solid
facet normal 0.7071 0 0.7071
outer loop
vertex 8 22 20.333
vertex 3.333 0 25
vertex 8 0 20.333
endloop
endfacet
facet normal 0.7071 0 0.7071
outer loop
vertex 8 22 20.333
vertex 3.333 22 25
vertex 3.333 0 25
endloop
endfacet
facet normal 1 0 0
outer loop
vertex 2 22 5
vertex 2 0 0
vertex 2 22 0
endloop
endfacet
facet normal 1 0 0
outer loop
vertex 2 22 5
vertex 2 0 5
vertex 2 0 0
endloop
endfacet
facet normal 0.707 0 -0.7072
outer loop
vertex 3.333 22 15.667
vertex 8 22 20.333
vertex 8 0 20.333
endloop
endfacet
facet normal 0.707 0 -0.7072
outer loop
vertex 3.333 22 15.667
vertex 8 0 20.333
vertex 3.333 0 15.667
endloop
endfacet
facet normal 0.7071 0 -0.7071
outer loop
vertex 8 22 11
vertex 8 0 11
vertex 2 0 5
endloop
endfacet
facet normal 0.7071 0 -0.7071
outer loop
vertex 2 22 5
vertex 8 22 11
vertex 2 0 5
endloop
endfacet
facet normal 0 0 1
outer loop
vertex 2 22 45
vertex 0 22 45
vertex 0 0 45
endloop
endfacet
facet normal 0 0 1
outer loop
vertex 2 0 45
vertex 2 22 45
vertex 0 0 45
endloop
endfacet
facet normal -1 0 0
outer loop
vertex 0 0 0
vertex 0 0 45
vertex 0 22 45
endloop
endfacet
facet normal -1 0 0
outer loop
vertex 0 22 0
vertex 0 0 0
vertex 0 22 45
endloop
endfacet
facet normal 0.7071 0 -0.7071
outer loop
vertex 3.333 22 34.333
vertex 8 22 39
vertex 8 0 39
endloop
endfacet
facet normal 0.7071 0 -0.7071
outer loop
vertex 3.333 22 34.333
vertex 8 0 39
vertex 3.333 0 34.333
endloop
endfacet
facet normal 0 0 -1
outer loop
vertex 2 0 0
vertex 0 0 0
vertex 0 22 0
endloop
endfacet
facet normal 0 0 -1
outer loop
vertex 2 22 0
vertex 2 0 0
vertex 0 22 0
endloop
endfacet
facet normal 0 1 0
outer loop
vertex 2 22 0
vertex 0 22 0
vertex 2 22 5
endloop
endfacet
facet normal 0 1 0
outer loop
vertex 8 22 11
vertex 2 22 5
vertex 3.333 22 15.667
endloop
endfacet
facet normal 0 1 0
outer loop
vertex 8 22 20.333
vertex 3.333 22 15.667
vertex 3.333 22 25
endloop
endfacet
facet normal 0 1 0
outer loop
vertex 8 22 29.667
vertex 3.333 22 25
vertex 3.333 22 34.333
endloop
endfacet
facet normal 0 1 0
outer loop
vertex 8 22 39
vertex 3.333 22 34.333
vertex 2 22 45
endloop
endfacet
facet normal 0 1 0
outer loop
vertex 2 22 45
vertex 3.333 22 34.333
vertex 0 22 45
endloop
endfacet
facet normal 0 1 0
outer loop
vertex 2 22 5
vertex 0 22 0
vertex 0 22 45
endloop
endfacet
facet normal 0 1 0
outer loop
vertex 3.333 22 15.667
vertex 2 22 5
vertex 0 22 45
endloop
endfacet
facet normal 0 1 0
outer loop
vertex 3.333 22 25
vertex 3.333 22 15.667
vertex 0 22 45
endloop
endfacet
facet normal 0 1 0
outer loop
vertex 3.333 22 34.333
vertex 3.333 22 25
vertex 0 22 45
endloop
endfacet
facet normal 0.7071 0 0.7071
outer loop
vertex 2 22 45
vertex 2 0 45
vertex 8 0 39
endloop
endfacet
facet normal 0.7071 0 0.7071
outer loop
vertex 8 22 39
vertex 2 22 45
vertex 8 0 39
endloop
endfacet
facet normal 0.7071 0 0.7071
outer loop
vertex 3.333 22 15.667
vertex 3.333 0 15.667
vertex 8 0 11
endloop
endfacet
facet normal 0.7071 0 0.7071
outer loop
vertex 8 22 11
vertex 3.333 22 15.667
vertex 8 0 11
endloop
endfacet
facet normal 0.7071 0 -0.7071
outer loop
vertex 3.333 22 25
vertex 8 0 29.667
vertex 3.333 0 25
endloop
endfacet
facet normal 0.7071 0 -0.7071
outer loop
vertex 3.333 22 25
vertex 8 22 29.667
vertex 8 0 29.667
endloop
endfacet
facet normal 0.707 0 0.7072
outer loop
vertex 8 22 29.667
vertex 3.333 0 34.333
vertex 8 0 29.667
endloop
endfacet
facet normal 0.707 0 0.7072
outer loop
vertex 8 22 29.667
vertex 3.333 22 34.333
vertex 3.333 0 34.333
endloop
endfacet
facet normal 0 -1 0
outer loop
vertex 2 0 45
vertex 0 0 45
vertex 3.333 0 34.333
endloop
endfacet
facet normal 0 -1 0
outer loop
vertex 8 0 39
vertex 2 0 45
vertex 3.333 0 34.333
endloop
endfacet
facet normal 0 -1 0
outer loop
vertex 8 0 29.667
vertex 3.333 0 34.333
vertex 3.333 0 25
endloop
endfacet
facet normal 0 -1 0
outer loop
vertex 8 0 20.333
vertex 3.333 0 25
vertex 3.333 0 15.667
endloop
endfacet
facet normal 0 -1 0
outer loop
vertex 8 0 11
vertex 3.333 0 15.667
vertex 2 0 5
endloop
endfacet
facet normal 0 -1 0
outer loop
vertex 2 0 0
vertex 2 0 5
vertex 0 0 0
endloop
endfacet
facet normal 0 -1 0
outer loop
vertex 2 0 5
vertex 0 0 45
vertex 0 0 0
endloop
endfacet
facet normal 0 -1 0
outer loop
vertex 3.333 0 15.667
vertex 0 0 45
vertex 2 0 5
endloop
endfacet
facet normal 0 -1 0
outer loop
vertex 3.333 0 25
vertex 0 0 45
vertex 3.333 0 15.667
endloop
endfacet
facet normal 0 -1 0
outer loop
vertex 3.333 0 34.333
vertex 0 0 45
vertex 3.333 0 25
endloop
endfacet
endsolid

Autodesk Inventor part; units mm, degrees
ref_plane "YZ Plane" through (0, 0, 0) normal (1, 0, 0) x (0, 1, 0)
ref_plane "XZ Plane" through (0, 0, 0) normal (0, 1, 0) x (-1, 0, 0)
ref_plane "XY Plane" through (0, 0, 0) normal (0, 0, 1) x (1, 0, 0)
sketch "スケッチ1" plane through (0, 0, 0) normal (1, 0, 0) x (0, 1, 0)
  line L0 (0, 0) -> (22, 0)
  line L1 (22, 0) -> (22, 45)
  line L2 (22, 45) -> (0, 45)
  line L3 (0, 45) -> (0, 0)
  dimension "d0" = 22
  dimension "d1" = 45
extrude "押し出し1" add sketch "スケッチ1" along normal blind 2
sketch "スケッチ2" plane through (0, 22, 45) normal (0, 1, 0) x (1, 0, 0)
  line L0 (0, 0) -> (2, 0) projected
  line L1 (2, 0) -> (8, 6)
  line L2 (8, 6) -> (3.3333, 10.6667)
  line L3 (3.3333, 10.6667) -> (8, 15.3333)
  line L4 (8, 15.3333) -> (3.3333, 20)
  line L5 (3.3333, 20) -> (8, 24.6667)
  line L6 (8, 24.6667) -> (3.3333, 29.3333)
  line L7 (3.3333, 29.3333) -> (8, 34)
  line L8 (8, 34) -> (2, 40)
  line L9 (2, 45) -> (2, 0) projected
  point P0 (0, 45)
  dimension "d4" = 40
  dimension "d5" = 6
extrude "押し出し2" add sketch "スケッチ2" against normal up to surface (22 mm away)
properties part number "finger"
